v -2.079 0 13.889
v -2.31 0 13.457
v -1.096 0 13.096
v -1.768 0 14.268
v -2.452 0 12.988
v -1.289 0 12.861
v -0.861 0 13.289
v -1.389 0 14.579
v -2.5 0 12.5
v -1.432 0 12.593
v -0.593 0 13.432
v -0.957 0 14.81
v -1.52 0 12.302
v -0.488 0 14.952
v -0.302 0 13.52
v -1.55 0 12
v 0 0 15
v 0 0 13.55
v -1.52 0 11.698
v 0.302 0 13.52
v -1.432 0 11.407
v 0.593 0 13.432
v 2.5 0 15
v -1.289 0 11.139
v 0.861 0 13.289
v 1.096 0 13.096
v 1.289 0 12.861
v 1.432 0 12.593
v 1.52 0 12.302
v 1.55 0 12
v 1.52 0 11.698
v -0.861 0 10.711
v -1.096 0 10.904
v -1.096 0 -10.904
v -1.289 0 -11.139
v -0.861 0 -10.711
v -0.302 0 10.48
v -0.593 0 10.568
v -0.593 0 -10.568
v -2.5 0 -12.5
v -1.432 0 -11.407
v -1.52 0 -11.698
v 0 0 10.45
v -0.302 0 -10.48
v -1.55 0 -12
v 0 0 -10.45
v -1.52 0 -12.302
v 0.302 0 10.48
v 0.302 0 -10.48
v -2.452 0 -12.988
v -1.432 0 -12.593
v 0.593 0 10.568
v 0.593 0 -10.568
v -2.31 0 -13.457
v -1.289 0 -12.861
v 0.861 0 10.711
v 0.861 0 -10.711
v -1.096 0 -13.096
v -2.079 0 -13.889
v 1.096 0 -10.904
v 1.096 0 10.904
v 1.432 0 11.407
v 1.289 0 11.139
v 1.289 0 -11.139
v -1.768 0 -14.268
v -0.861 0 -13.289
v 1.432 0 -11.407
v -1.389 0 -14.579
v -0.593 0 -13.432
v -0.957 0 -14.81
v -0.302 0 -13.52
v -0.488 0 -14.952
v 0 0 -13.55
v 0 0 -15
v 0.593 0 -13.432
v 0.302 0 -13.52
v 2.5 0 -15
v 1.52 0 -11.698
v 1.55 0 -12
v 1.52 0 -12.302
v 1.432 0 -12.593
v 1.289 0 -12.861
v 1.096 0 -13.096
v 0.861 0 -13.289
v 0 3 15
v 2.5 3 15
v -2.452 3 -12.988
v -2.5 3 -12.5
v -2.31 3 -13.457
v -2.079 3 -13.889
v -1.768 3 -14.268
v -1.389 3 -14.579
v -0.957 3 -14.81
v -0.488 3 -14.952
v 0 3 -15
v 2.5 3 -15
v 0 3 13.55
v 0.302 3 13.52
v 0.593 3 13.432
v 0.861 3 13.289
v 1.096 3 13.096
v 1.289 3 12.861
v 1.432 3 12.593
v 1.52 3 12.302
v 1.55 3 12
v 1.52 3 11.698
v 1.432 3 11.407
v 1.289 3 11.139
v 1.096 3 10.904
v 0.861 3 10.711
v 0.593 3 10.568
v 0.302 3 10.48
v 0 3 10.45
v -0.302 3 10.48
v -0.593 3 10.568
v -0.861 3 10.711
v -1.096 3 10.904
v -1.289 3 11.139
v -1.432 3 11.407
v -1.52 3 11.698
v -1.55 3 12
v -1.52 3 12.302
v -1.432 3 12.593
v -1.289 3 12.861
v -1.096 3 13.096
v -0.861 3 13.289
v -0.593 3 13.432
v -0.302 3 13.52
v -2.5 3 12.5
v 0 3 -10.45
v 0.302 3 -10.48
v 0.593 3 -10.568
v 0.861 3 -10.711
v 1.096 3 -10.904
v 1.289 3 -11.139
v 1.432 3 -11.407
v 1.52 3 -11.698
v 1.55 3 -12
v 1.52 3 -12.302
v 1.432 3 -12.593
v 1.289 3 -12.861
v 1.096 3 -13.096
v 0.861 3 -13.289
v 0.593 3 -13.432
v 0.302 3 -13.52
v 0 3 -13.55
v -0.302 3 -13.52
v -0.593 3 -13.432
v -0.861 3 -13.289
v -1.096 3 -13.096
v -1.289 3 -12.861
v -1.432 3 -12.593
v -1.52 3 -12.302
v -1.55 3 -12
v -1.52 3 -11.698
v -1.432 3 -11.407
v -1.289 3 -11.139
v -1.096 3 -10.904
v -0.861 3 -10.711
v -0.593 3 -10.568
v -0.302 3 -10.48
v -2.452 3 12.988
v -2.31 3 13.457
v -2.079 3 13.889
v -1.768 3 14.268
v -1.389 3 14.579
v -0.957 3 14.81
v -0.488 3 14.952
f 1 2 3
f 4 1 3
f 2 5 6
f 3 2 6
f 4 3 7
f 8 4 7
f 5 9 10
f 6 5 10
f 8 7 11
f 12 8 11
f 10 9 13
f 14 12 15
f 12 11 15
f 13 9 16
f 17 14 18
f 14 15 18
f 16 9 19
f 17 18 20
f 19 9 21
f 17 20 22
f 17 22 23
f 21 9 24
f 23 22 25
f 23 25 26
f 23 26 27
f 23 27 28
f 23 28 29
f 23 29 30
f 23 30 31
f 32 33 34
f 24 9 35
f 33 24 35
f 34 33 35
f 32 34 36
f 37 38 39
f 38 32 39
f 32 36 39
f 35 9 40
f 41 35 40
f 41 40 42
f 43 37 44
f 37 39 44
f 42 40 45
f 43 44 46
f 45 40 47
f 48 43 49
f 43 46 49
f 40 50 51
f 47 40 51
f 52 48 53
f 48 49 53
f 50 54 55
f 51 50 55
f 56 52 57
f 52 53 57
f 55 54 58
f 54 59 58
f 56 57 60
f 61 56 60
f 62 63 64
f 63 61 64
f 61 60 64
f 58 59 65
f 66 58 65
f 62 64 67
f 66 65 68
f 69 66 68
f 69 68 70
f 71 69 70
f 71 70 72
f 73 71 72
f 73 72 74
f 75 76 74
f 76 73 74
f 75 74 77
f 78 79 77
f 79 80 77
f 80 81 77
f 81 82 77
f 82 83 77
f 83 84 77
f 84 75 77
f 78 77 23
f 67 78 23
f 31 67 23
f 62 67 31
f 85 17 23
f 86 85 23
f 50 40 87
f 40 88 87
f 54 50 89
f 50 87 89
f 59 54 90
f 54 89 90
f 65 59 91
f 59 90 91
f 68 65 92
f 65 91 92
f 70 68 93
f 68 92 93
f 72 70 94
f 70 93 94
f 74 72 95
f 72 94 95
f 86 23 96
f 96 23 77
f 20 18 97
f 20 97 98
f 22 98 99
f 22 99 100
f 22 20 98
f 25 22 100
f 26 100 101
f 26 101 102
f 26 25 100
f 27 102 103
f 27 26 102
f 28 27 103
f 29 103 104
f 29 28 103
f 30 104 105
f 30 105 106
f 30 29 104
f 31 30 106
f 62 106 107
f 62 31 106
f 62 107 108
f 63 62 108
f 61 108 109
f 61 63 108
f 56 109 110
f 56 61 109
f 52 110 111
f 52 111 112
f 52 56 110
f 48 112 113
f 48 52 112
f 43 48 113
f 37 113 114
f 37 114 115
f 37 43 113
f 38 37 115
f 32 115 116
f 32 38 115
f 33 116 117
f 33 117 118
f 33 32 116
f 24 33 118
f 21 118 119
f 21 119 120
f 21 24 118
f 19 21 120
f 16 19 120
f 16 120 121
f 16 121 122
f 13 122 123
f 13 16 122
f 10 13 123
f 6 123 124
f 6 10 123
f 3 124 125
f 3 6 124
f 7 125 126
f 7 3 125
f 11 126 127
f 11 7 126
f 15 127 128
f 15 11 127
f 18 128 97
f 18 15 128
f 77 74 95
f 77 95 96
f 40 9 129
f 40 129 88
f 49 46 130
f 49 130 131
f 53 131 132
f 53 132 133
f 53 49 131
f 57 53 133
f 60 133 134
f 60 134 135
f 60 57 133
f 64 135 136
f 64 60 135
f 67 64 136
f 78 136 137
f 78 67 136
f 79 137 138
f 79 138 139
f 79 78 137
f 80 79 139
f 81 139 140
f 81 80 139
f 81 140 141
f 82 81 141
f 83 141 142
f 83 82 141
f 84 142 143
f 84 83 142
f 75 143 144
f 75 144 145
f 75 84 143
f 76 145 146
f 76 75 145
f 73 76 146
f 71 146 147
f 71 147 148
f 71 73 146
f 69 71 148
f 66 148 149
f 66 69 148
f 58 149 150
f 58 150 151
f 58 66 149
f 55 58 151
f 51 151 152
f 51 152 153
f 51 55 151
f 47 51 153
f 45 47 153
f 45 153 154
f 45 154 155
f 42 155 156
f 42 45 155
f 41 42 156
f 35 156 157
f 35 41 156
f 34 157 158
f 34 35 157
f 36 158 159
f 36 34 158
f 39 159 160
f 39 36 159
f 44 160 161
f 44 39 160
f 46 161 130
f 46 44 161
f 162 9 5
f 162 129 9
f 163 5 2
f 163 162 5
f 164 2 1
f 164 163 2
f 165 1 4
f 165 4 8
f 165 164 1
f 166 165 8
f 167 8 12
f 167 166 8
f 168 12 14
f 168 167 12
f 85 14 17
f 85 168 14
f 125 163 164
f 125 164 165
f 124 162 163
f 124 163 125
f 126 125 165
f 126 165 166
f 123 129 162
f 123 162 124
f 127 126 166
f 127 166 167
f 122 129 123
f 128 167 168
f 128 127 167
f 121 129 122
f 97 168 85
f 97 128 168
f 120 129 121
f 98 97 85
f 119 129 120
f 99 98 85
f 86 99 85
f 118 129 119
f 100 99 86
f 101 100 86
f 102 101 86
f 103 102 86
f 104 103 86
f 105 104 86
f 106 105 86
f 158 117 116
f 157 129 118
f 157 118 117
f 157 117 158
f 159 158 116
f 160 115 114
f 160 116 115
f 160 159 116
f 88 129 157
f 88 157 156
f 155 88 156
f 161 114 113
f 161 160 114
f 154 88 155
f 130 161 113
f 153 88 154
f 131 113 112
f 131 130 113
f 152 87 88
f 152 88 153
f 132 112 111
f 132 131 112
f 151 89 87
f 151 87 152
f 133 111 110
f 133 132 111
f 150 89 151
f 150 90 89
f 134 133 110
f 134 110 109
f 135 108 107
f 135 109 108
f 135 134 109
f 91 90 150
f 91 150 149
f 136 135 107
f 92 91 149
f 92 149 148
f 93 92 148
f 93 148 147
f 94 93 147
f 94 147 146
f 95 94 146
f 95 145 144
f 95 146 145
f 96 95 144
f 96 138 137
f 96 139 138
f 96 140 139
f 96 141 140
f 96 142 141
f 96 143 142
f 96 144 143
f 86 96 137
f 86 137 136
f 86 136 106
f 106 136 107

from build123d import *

# Parameters (mm, degrees)
SKETCH1_W           = 5
SKETCH1_H           = 30
SKETCH1_R           = 1.55
BOSS_EXTRUDE1_DEPTH = 3
FILLET1_R           = 2.5


with BuildPart() as part:
    # Sketch1 → Boss-Extrude1 (new body)
    with BuildSketch(Plane(origin=(0, 0, 0), x_dir=(1, 0, 0), z_dir=(0, 1, 0))):
        Rectangle(SKETCH1_W, SKETCH1_H)
        with Locations(Location((0, 12, 0), (0, 0, 270))):
            Circle(SKETCH1_R, mode=Mode.SUBTRACT)
        with Locations(Location((0, -12, 0), (0, 0, 270))):
            Circle(SKETCH1_R, mode=Mode.SUBTRACT)
    extrude(amount=BOSS_EXTRUDE1_DEPTH)

    # Fillet1
    fillet1_edges = [part.edges().sort_by_distance(p)[0] for p in [
        (-2.5, 1.5, 15),
        (-2.5, 1.5, -15),
    ]]
    fillet(fillet1_edges, radius=FILLET1_R)


solid = part.part
